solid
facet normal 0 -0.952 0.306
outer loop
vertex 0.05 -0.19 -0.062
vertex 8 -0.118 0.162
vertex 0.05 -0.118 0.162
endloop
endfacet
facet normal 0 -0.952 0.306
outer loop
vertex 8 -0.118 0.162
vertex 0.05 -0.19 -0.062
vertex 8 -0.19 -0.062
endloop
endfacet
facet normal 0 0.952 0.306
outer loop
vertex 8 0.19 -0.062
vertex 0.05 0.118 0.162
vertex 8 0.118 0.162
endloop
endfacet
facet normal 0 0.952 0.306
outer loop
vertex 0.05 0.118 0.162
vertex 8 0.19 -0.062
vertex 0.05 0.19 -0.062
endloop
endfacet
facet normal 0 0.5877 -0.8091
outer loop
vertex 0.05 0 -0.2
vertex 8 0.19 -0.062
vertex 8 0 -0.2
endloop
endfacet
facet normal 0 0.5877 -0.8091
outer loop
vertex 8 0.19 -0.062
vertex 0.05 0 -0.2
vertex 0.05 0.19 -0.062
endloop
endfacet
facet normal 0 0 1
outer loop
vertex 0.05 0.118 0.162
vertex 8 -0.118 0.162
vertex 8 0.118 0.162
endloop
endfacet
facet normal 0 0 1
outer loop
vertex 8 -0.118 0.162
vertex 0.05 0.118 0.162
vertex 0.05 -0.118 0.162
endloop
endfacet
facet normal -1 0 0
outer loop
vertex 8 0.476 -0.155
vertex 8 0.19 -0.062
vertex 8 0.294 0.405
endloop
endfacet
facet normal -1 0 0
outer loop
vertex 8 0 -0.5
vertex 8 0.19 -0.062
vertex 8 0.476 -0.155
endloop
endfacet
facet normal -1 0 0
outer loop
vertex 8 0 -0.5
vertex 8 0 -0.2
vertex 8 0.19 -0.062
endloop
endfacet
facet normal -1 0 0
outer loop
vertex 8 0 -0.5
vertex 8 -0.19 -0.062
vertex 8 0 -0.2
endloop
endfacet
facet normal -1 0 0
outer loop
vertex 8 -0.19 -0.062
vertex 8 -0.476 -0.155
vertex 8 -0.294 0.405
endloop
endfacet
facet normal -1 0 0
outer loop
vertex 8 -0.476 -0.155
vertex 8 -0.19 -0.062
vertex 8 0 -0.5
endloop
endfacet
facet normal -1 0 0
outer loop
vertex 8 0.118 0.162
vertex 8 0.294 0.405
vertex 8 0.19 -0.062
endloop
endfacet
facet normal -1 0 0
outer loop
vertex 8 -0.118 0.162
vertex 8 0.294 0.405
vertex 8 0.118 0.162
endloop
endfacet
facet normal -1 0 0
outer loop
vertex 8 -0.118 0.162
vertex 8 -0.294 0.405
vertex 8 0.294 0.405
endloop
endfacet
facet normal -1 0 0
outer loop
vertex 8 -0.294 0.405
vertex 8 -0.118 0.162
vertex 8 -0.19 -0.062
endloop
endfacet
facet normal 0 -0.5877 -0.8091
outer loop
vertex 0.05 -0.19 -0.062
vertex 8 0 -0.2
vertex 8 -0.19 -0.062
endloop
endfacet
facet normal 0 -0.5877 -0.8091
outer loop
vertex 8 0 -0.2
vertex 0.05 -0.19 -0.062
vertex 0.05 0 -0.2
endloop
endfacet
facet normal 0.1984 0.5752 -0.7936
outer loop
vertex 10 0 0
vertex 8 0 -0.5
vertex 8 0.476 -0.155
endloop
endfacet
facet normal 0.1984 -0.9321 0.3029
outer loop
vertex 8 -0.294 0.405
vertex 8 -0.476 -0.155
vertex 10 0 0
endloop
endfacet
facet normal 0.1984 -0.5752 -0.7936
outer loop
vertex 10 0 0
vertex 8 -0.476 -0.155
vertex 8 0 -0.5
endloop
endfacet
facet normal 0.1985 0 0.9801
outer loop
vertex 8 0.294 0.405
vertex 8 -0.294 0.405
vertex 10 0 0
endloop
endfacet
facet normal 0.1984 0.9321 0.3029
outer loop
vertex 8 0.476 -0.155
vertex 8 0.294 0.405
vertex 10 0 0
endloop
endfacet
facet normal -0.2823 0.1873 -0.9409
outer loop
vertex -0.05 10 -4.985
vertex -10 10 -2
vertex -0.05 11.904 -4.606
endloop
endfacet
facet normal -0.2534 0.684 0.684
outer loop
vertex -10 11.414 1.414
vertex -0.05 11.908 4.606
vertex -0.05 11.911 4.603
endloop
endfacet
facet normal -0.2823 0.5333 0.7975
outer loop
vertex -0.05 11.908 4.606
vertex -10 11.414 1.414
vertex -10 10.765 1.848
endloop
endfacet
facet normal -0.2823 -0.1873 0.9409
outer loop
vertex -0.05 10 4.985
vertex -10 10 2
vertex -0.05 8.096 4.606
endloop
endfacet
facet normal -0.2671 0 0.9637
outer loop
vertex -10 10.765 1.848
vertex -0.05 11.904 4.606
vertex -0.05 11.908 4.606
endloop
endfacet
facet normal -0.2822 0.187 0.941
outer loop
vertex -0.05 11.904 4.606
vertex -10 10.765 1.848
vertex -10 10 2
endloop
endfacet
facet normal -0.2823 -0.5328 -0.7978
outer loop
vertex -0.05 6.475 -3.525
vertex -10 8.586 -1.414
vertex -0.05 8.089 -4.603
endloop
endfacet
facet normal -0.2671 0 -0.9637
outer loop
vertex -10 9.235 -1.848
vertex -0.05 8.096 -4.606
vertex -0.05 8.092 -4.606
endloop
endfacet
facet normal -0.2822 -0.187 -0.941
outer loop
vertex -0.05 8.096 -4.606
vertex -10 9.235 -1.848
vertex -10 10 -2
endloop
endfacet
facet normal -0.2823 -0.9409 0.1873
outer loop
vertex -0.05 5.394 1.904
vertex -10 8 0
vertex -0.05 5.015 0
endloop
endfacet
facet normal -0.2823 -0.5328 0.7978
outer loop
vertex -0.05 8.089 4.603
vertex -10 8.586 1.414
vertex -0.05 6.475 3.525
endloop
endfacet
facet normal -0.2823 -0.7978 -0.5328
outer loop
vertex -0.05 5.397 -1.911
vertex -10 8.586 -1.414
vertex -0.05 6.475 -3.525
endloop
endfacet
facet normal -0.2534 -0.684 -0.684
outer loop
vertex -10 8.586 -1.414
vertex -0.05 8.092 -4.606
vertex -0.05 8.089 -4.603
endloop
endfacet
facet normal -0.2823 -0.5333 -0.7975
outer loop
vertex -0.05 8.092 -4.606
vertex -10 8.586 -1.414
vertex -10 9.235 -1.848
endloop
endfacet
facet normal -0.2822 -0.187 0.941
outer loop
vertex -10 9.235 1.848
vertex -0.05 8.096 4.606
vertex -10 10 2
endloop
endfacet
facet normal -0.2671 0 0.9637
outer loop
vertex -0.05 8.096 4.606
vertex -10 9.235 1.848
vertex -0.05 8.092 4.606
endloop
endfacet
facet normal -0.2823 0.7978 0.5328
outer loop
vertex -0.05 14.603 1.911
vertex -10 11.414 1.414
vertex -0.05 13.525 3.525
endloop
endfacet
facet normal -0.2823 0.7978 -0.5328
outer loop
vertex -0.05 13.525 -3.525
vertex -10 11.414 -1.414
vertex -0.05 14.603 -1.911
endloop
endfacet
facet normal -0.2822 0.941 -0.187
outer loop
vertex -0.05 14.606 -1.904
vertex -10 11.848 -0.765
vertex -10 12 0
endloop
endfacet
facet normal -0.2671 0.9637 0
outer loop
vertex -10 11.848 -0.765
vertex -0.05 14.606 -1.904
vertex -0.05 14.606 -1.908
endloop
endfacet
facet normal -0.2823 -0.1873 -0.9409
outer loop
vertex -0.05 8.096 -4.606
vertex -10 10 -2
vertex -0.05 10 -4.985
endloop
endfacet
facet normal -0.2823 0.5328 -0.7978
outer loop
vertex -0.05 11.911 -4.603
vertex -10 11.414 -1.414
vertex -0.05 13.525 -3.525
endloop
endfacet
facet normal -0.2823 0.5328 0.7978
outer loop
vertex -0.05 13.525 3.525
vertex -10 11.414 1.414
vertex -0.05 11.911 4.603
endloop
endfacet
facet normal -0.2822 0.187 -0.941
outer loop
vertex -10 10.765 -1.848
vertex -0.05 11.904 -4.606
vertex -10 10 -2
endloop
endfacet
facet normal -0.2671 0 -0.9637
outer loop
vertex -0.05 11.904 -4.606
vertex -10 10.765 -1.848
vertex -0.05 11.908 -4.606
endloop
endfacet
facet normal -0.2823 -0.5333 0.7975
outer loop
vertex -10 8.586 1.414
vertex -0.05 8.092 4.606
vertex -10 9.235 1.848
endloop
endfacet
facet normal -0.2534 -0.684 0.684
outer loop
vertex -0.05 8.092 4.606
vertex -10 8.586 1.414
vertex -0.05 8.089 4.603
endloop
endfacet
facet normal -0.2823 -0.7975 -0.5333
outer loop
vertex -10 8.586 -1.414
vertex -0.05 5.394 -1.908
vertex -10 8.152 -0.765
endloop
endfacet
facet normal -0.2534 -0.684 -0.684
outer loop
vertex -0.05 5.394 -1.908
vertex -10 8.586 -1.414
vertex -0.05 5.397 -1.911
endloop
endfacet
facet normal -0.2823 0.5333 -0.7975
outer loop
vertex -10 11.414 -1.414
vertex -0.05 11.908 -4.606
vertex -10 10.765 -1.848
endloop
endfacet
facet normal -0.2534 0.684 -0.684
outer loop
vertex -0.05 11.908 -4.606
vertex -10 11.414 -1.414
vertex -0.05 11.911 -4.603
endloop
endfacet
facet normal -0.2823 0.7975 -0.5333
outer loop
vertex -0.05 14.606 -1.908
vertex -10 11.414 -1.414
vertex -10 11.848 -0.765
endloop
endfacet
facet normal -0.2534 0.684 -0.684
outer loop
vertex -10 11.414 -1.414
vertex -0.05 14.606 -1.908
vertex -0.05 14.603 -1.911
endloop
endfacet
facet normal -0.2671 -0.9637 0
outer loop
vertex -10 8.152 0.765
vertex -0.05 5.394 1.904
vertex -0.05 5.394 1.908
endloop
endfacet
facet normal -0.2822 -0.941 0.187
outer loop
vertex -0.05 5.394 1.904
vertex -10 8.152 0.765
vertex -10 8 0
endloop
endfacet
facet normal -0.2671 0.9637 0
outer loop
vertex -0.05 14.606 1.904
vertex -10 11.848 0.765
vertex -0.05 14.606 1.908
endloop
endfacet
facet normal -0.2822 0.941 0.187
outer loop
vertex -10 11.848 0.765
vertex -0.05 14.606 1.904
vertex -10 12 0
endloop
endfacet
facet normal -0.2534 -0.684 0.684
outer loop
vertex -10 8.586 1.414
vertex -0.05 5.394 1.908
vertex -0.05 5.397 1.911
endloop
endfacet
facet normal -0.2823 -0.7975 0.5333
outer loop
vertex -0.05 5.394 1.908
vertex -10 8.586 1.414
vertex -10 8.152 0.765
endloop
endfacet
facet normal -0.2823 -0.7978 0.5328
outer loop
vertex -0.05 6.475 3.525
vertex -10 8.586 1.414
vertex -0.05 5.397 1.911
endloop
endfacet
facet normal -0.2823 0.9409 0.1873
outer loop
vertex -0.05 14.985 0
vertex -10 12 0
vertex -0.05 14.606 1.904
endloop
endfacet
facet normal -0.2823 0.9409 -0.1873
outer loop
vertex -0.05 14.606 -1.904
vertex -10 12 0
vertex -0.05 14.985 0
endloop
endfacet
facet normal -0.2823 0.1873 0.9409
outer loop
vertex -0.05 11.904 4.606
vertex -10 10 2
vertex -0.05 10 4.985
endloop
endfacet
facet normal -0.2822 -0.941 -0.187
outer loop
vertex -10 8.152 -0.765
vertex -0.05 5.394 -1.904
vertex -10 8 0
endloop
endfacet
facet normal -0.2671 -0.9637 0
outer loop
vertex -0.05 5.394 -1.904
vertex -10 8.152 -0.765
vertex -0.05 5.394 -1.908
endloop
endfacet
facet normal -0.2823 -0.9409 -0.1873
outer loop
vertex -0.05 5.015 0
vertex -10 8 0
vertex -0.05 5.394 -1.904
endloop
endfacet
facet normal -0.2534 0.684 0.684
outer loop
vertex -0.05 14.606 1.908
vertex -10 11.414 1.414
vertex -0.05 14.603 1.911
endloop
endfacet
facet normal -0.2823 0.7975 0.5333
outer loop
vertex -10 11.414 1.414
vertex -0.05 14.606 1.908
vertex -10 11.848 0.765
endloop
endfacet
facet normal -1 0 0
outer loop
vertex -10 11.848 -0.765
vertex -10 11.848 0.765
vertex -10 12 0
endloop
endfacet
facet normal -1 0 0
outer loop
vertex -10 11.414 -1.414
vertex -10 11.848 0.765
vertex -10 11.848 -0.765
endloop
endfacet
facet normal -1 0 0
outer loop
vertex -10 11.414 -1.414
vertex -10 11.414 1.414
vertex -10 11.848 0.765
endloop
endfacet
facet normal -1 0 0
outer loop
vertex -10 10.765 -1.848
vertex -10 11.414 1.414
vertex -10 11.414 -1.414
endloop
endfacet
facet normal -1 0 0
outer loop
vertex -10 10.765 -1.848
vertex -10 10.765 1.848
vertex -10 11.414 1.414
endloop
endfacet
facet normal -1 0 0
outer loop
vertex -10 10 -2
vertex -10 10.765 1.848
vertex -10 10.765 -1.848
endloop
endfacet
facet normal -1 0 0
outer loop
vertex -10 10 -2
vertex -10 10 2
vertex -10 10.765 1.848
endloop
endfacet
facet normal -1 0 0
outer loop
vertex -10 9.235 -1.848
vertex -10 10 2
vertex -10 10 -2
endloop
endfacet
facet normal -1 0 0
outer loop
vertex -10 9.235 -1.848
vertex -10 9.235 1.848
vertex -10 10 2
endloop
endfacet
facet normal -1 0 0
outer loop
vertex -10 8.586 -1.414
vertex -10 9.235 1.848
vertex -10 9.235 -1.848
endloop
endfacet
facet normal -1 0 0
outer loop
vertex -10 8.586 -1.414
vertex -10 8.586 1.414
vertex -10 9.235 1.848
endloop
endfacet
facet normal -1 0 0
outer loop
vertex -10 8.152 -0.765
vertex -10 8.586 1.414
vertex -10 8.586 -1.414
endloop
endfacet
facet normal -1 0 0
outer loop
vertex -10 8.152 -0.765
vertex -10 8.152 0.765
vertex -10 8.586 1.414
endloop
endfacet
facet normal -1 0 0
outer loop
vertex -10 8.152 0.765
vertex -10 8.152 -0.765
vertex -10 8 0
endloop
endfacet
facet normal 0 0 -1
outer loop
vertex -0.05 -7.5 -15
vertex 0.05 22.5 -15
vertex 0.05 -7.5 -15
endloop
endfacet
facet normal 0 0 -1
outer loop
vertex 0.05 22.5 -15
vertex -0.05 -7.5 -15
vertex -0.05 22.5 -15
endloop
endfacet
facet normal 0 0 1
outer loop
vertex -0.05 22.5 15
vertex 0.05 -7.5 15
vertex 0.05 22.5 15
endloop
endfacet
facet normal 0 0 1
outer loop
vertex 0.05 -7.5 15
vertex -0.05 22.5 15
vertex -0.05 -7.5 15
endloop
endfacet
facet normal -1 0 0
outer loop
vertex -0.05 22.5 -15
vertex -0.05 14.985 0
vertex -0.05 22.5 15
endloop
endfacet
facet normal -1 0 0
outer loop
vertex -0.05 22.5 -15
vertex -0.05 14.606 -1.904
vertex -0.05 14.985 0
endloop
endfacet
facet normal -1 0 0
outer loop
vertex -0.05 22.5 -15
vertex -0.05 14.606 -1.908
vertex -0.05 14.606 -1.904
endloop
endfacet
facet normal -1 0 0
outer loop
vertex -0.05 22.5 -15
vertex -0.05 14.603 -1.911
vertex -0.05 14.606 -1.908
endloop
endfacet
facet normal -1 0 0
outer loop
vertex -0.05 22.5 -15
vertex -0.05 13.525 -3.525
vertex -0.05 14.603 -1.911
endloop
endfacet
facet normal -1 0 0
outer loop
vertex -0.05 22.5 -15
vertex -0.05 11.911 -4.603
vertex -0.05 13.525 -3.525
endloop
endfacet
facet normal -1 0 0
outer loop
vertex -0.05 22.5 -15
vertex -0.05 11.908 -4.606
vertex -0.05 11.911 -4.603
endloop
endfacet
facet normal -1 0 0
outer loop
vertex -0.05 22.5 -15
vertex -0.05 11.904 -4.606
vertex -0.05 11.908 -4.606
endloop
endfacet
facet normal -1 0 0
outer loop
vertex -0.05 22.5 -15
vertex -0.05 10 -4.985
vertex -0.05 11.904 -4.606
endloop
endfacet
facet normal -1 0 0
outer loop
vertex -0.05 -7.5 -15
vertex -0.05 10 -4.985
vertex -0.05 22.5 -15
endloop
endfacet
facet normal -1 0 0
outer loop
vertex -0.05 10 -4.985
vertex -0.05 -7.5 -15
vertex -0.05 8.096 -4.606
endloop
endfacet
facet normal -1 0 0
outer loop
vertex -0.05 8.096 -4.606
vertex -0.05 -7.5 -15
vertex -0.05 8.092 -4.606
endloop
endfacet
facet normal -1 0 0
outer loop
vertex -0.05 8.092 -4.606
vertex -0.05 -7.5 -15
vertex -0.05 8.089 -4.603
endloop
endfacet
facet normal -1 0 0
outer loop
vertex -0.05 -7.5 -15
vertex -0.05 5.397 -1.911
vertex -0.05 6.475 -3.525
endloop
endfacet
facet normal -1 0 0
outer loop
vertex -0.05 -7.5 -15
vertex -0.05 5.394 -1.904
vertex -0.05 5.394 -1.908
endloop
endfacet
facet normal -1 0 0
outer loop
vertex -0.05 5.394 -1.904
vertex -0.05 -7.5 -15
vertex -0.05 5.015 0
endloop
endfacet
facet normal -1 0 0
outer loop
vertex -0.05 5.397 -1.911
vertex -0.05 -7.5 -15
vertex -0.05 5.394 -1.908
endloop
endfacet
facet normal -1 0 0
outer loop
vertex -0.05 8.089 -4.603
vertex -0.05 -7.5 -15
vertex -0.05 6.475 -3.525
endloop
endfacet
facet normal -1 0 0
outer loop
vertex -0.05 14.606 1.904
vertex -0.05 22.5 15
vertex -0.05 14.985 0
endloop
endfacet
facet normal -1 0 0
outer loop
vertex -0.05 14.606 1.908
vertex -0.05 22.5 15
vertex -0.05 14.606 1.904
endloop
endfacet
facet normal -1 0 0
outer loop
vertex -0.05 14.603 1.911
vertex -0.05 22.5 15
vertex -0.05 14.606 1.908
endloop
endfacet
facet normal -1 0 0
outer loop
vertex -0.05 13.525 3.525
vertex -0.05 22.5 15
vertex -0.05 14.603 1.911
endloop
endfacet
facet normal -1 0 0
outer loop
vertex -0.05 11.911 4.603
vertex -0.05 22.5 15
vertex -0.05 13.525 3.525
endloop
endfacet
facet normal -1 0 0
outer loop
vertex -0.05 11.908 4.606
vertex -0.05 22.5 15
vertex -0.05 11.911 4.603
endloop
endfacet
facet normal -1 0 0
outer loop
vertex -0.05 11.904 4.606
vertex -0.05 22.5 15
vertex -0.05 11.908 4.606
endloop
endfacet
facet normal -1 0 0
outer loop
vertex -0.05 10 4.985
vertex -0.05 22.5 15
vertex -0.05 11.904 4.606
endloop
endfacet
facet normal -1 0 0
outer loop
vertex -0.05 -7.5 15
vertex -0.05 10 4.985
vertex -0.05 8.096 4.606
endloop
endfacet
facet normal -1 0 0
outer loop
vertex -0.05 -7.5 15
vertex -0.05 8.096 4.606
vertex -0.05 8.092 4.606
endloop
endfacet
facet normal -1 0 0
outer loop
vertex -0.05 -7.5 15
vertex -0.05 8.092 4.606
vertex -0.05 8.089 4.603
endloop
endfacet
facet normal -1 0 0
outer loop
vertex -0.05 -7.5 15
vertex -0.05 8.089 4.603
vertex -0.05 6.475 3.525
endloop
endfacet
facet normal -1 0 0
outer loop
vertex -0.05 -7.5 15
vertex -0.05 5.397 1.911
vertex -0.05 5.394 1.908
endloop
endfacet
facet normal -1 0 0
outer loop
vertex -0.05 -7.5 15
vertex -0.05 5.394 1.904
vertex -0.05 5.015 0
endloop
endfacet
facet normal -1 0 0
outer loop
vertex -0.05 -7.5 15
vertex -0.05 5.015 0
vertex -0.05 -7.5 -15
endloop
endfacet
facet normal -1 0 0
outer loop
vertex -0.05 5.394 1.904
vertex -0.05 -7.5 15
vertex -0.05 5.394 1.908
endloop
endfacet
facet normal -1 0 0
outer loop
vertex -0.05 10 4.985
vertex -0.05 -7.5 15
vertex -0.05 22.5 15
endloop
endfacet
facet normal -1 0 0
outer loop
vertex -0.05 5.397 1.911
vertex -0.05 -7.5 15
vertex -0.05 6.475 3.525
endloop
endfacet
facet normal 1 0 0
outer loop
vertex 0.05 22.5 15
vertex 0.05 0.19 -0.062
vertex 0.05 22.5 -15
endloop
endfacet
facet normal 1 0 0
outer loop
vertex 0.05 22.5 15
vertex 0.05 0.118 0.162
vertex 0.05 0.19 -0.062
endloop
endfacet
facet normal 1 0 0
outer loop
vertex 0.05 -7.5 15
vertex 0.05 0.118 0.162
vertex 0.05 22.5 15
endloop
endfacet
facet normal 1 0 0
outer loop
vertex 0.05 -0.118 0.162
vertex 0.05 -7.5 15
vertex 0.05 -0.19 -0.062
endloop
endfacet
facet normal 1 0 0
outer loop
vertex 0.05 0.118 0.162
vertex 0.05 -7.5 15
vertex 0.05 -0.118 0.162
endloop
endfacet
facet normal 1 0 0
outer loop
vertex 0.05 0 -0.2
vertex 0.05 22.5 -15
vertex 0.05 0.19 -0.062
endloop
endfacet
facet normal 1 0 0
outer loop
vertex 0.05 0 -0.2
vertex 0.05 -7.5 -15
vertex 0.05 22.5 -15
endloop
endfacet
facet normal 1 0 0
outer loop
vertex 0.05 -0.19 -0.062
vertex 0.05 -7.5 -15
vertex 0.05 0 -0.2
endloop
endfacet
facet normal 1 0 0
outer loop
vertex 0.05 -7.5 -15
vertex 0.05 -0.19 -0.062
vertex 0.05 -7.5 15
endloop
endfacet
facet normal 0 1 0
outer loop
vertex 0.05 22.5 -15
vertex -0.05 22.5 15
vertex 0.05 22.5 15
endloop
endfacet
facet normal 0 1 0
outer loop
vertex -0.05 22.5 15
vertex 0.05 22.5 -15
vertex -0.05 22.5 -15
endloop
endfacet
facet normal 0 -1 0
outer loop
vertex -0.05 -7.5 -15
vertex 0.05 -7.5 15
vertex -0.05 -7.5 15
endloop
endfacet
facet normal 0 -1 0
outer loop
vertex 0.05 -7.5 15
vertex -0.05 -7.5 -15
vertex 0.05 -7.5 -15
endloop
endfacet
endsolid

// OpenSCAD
mirror([10, 0, 0]) translate([0,10,0]) rotate([0,90,0]) cylinder(h=10, r1=5, r2=2);
%translate([0,10,0]) rotate([0,90,0]) cylinder(h=10, r1=5, r2=2);

color("green") rotate([0,90,0]) {
      cylinder(h=8, r1=0.2, r2=0.2);
      translate([0, 0, 8]) cylinder(h=2, r1=0.5, r2=0);
   }

color("LightBlue", 0.3) rotate([0, -90, 0]) translate([0,7.5,0]) cube([30, 30, 0.1], center=true);
